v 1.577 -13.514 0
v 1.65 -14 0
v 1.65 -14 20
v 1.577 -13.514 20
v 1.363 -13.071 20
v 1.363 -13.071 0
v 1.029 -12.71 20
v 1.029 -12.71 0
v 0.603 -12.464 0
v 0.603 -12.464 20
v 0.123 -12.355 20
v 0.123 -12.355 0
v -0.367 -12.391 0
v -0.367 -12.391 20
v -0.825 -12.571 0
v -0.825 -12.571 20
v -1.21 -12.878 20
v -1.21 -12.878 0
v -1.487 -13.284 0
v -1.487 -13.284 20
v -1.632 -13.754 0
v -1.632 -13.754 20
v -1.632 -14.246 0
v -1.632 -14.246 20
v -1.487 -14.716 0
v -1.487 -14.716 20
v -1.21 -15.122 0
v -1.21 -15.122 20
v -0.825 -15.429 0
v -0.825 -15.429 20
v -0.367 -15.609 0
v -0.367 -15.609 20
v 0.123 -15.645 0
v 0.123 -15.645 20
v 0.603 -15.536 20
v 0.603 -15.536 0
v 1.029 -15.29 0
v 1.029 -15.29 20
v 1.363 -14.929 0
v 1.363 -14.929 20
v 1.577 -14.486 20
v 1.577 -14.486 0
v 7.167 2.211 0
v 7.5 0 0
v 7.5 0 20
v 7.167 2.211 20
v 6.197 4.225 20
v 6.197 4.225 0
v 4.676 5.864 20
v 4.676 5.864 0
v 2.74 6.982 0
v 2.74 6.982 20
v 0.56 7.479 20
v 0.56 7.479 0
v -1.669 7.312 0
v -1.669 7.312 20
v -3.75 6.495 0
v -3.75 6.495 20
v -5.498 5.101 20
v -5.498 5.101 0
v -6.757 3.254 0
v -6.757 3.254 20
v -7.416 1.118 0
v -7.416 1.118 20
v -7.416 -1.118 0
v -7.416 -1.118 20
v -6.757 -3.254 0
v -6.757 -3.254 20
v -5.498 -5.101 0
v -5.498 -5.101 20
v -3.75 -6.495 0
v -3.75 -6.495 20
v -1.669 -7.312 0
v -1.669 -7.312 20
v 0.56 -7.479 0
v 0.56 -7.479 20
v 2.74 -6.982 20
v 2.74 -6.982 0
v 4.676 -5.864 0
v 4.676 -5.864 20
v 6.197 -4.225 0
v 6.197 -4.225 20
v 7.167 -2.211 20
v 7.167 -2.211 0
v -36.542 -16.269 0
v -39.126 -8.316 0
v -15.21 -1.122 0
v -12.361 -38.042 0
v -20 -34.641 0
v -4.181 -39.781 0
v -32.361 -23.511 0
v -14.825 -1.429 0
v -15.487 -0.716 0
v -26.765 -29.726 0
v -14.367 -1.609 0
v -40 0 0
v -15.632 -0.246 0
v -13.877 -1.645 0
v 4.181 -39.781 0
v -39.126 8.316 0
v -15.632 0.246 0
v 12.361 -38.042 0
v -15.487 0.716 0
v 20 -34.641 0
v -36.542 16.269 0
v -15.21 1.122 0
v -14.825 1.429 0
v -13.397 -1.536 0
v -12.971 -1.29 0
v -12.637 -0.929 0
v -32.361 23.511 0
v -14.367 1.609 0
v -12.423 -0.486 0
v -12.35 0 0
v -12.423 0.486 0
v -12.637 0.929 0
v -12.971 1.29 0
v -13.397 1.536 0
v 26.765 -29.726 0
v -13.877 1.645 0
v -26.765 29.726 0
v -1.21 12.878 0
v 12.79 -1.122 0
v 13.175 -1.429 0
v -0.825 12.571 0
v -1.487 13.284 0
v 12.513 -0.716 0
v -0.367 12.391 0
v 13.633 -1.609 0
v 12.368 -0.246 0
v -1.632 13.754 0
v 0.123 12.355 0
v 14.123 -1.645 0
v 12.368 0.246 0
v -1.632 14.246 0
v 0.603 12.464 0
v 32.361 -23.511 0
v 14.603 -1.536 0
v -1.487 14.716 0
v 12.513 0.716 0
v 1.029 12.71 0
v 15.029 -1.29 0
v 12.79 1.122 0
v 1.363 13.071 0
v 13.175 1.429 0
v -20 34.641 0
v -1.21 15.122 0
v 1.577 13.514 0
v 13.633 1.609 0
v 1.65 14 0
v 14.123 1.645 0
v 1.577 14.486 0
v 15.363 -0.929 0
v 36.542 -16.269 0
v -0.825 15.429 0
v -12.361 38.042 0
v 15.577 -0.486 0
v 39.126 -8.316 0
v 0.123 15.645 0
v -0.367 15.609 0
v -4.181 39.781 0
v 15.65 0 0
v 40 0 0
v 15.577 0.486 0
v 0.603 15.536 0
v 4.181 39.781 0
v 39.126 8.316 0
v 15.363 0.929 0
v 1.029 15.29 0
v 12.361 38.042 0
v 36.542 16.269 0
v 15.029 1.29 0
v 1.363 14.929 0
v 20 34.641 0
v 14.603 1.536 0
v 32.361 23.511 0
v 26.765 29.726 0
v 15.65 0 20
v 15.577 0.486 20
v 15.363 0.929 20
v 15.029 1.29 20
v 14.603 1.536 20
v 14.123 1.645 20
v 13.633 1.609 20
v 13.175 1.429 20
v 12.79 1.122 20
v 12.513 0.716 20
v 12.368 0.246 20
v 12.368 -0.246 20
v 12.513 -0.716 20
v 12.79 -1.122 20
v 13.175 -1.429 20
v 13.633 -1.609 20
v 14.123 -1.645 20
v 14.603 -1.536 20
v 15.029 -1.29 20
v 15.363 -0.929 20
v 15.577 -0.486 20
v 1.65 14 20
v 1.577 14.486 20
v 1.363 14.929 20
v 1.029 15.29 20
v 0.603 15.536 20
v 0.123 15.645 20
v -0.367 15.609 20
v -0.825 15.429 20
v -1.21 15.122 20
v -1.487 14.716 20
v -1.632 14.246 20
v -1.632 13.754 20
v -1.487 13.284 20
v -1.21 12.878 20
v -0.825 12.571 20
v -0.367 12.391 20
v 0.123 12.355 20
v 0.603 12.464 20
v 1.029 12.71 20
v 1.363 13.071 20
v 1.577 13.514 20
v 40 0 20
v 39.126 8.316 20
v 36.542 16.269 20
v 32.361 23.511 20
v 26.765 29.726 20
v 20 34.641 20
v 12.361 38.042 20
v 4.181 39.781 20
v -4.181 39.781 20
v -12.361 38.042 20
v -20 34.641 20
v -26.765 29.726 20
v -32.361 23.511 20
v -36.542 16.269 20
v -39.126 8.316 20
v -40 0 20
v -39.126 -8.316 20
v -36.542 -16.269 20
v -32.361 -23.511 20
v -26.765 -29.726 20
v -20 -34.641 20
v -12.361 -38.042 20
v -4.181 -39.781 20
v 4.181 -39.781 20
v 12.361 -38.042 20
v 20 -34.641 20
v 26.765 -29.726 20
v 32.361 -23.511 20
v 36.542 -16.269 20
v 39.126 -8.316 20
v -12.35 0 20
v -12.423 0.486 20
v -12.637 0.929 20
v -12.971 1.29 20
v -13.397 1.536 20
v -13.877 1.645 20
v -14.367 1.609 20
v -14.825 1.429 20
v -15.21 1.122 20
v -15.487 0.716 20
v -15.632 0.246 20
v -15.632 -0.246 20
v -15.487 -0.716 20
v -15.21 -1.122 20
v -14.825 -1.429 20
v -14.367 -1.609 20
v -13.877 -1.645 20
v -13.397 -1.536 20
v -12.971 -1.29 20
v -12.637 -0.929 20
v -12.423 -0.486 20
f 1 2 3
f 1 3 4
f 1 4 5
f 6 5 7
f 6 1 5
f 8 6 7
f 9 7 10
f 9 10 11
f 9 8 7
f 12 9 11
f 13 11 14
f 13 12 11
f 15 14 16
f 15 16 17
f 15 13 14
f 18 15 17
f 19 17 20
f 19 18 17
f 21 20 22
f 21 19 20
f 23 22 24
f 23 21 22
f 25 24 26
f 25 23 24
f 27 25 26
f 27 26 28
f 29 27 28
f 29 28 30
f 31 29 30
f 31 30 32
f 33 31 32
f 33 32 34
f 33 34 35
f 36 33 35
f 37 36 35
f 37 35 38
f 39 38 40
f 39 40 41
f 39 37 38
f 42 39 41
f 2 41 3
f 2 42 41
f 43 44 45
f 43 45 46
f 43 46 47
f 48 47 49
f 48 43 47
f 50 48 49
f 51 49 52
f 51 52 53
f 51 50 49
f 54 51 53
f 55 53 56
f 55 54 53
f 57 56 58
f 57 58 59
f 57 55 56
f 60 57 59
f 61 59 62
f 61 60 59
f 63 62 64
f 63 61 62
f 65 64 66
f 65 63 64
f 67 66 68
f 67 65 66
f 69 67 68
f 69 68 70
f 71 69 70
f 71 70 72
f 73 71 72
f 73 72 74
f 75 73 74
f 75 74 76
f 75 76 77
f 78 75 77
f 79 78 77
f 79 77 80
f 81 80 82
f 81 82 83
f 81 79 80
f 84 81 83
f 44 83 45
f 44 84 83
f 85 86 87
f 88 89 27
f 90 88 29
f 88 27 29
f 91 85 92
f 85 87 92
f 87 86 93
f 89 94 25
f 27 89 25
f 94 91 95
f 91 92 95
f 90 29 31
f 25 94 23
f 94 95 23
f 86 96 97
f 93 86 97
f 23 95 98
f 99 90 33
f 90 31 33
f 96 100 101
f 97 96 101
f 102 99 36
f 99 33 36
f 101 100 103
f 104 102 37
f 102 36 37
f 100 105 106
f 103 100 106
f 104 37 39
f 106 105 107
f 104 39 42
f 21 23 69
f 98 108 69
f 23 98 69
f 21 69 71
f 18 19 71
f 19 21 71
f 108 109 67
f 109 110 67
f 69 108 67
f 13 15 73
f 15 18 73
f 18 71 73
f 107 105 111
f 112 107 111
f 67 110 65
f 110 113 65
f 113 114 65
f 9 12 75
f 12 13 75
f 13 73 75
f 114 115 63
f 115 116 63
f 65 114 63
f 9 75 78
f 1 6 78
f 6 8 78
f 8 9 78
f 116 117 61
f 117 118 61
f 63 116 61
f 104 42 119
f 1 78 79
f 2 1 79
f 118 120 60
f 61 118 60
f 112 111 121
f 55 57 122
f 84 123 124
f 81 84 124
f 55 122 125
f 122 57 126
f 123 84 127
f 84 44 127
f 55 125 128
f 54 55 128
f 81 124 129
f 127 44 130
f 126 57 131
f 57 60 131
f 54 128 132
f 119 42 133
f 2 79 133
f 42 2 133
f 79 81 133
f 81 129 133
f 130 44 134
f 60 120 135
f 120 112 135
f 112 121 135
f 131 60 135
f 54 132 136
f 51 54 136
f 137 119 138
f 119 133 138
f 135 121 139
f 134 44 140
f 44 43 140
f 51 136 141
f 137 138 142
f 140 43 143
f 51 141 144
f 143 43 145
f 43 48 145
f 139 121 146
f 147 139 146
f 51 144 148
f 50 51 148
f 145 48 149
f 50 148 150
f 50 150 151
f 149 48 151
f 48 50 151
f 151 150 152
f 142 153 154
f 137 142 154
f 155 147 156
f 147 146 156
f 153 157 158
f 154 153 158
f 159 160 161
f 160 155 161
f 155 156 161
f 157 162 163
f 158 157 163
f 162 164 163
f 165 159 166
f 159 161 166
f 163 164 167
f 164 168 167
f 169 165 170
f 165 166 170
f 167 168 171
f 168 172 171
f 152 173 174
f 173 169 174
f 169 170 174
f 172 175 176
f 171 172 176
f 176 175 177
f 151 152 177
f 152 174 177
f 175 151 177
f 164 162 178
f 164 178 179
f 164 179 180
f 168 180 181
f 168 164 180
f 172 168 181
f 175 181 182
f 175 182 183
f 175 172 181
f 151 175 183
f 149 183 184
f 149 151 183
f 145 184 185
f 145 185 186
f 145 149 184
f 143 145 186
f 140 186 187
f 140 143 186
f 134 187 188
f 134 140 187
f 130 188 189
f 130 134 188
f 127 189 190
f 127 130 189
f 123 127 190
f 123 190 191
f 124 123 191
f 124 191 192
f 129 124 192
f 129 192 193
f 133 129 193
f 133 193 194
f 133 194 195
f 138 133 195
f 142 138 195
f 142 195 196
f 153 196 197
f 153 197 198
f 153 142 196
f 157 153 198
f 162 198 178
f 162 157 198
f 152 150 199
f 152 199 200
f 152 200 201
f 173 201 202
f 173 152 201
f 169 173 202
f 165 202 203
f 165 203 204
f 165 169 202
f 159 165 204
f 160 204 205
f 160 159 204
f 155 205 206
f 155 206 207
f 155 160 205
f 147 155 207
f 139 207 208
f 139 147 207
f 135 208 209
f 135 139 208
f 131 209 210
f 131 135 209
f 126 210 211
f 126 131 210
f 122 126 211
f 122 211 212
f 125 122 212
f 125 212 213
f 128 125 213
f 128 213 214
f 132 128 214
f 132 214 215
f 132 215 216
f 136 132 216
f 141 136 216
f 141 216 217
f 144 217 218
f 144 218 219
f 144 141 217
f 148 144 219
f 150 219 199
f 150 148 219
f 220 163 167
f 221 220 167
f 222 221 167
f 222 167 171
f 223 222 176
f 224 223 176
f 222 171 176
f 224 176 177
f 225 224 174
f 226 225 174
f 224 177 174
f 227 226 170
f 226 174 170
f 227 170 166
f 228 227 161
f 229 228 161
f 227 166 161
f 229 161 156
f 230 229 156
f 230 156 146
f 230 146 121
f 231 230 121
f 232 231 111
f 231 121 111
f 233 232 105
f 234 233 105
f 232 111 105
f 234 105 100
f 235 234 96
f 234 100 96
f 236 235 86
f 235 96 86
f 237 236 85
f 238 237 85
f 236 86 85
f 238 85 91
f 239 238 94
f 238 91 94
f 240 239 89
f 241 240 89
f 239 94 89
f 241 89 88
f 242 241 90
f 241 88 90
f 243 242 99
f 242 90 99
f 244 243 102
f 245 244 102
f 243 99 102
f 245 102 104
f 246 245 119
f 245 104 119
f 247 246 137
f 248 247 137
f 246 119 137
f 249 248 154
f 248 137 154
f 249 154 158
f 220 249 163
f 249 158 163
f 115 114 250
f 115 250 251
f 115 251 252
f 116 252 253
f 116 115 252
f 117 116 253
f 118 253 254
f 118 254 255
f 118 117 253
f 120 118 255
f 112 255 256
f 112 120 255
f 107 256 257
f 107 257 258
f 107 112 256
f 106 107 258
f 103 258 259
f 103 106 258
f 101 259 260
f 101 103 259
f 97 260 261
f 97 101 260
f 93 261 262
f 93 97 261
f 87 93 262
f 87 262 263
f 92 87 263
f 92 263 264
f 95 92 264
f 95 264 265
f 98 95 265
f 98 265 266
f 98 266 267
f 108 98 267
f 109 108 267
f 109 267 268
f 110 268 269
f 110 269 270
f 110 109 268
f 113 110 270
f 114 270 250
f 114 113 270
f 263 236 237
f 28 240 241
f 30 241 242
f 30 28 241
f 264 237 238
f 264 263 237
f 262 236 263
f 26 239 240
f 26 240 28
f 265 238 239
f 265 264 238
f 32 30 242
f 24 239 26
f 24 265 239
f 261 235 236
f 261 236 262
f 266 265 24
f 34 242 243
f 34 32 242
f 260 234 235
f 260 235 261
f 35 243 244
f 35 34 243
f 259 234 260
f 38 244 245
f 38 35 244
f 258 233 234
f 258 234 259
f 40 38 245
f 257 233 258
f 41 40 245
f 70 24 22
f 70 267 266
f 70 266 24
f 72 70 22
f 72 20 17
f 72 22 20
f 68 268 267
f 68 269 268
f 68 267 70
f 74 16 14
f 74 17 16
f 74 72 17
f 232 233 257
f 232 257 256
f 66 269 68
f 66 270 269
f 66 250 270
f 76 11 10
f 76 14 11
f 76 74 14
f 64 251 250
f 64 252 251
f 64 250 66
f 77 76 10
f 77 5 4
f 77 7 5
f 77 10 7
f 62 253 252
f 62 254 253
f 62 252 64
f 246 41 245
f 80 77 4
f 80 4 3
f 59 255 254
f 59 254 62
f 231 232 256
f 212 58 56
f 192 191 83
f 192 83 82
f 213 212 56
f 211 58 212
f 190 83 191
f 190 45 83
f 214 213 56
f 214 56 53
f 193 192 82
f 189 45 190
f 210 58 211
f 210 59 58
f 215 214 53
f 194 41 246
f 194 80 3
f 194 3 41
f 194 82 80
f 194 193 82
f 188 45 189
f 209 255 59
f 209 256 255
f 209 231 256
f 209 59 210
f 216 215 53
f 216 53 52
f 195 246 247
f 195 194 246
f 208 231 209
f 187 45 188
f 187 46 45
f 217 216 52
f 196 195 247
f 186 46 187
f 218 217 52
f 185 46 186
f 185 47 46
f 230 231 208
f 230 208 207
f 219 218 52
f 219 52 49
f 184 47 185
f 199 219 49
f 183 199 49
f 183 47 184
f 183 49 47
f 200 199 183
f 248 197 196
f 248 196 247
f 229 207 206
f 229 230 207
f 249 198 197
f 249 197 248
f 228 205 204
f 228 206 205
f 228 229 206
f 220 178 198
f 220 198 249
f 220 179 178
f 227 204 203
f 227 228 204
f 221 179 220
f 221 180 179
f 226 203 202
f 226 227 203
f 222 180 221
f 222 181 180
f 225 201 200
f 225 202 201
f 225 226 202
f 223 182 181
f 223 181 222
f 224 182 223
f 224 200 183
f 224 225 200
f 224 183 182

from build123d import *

# Parameters (mm, degrees)
F0_R     = 40
F0_R_2   = 7.5
F2_DEPTH = 20
F1_R     = 1.65
F3_DEPTH = 20


with BuildPart() as f2:
    # F0 (on Top) → F2 (new body)
    with BuildSketch(Plane.XY):
        Circle(F0_R)
        Circle(F0_R_2, mode=Mode.SUBTRACT)
    extrude(amount=F2_DEPTH)

    # F1 (on Top) → F3 (cut)
    with BuildSketch(Plane.XY):
        with Locations((0, -14)):
            Circle(F1_R)
        with Locations((14, 0)):
            Circle(F1_R)
        with Locations((0, 14)):
            Circle(F1_R)
        with Locations((-14, 0)):
            Circle(F1_R)
    extrude(amount=F3_DEPTH, mode=Mode.SUBTRACT)


solid = f2.part
